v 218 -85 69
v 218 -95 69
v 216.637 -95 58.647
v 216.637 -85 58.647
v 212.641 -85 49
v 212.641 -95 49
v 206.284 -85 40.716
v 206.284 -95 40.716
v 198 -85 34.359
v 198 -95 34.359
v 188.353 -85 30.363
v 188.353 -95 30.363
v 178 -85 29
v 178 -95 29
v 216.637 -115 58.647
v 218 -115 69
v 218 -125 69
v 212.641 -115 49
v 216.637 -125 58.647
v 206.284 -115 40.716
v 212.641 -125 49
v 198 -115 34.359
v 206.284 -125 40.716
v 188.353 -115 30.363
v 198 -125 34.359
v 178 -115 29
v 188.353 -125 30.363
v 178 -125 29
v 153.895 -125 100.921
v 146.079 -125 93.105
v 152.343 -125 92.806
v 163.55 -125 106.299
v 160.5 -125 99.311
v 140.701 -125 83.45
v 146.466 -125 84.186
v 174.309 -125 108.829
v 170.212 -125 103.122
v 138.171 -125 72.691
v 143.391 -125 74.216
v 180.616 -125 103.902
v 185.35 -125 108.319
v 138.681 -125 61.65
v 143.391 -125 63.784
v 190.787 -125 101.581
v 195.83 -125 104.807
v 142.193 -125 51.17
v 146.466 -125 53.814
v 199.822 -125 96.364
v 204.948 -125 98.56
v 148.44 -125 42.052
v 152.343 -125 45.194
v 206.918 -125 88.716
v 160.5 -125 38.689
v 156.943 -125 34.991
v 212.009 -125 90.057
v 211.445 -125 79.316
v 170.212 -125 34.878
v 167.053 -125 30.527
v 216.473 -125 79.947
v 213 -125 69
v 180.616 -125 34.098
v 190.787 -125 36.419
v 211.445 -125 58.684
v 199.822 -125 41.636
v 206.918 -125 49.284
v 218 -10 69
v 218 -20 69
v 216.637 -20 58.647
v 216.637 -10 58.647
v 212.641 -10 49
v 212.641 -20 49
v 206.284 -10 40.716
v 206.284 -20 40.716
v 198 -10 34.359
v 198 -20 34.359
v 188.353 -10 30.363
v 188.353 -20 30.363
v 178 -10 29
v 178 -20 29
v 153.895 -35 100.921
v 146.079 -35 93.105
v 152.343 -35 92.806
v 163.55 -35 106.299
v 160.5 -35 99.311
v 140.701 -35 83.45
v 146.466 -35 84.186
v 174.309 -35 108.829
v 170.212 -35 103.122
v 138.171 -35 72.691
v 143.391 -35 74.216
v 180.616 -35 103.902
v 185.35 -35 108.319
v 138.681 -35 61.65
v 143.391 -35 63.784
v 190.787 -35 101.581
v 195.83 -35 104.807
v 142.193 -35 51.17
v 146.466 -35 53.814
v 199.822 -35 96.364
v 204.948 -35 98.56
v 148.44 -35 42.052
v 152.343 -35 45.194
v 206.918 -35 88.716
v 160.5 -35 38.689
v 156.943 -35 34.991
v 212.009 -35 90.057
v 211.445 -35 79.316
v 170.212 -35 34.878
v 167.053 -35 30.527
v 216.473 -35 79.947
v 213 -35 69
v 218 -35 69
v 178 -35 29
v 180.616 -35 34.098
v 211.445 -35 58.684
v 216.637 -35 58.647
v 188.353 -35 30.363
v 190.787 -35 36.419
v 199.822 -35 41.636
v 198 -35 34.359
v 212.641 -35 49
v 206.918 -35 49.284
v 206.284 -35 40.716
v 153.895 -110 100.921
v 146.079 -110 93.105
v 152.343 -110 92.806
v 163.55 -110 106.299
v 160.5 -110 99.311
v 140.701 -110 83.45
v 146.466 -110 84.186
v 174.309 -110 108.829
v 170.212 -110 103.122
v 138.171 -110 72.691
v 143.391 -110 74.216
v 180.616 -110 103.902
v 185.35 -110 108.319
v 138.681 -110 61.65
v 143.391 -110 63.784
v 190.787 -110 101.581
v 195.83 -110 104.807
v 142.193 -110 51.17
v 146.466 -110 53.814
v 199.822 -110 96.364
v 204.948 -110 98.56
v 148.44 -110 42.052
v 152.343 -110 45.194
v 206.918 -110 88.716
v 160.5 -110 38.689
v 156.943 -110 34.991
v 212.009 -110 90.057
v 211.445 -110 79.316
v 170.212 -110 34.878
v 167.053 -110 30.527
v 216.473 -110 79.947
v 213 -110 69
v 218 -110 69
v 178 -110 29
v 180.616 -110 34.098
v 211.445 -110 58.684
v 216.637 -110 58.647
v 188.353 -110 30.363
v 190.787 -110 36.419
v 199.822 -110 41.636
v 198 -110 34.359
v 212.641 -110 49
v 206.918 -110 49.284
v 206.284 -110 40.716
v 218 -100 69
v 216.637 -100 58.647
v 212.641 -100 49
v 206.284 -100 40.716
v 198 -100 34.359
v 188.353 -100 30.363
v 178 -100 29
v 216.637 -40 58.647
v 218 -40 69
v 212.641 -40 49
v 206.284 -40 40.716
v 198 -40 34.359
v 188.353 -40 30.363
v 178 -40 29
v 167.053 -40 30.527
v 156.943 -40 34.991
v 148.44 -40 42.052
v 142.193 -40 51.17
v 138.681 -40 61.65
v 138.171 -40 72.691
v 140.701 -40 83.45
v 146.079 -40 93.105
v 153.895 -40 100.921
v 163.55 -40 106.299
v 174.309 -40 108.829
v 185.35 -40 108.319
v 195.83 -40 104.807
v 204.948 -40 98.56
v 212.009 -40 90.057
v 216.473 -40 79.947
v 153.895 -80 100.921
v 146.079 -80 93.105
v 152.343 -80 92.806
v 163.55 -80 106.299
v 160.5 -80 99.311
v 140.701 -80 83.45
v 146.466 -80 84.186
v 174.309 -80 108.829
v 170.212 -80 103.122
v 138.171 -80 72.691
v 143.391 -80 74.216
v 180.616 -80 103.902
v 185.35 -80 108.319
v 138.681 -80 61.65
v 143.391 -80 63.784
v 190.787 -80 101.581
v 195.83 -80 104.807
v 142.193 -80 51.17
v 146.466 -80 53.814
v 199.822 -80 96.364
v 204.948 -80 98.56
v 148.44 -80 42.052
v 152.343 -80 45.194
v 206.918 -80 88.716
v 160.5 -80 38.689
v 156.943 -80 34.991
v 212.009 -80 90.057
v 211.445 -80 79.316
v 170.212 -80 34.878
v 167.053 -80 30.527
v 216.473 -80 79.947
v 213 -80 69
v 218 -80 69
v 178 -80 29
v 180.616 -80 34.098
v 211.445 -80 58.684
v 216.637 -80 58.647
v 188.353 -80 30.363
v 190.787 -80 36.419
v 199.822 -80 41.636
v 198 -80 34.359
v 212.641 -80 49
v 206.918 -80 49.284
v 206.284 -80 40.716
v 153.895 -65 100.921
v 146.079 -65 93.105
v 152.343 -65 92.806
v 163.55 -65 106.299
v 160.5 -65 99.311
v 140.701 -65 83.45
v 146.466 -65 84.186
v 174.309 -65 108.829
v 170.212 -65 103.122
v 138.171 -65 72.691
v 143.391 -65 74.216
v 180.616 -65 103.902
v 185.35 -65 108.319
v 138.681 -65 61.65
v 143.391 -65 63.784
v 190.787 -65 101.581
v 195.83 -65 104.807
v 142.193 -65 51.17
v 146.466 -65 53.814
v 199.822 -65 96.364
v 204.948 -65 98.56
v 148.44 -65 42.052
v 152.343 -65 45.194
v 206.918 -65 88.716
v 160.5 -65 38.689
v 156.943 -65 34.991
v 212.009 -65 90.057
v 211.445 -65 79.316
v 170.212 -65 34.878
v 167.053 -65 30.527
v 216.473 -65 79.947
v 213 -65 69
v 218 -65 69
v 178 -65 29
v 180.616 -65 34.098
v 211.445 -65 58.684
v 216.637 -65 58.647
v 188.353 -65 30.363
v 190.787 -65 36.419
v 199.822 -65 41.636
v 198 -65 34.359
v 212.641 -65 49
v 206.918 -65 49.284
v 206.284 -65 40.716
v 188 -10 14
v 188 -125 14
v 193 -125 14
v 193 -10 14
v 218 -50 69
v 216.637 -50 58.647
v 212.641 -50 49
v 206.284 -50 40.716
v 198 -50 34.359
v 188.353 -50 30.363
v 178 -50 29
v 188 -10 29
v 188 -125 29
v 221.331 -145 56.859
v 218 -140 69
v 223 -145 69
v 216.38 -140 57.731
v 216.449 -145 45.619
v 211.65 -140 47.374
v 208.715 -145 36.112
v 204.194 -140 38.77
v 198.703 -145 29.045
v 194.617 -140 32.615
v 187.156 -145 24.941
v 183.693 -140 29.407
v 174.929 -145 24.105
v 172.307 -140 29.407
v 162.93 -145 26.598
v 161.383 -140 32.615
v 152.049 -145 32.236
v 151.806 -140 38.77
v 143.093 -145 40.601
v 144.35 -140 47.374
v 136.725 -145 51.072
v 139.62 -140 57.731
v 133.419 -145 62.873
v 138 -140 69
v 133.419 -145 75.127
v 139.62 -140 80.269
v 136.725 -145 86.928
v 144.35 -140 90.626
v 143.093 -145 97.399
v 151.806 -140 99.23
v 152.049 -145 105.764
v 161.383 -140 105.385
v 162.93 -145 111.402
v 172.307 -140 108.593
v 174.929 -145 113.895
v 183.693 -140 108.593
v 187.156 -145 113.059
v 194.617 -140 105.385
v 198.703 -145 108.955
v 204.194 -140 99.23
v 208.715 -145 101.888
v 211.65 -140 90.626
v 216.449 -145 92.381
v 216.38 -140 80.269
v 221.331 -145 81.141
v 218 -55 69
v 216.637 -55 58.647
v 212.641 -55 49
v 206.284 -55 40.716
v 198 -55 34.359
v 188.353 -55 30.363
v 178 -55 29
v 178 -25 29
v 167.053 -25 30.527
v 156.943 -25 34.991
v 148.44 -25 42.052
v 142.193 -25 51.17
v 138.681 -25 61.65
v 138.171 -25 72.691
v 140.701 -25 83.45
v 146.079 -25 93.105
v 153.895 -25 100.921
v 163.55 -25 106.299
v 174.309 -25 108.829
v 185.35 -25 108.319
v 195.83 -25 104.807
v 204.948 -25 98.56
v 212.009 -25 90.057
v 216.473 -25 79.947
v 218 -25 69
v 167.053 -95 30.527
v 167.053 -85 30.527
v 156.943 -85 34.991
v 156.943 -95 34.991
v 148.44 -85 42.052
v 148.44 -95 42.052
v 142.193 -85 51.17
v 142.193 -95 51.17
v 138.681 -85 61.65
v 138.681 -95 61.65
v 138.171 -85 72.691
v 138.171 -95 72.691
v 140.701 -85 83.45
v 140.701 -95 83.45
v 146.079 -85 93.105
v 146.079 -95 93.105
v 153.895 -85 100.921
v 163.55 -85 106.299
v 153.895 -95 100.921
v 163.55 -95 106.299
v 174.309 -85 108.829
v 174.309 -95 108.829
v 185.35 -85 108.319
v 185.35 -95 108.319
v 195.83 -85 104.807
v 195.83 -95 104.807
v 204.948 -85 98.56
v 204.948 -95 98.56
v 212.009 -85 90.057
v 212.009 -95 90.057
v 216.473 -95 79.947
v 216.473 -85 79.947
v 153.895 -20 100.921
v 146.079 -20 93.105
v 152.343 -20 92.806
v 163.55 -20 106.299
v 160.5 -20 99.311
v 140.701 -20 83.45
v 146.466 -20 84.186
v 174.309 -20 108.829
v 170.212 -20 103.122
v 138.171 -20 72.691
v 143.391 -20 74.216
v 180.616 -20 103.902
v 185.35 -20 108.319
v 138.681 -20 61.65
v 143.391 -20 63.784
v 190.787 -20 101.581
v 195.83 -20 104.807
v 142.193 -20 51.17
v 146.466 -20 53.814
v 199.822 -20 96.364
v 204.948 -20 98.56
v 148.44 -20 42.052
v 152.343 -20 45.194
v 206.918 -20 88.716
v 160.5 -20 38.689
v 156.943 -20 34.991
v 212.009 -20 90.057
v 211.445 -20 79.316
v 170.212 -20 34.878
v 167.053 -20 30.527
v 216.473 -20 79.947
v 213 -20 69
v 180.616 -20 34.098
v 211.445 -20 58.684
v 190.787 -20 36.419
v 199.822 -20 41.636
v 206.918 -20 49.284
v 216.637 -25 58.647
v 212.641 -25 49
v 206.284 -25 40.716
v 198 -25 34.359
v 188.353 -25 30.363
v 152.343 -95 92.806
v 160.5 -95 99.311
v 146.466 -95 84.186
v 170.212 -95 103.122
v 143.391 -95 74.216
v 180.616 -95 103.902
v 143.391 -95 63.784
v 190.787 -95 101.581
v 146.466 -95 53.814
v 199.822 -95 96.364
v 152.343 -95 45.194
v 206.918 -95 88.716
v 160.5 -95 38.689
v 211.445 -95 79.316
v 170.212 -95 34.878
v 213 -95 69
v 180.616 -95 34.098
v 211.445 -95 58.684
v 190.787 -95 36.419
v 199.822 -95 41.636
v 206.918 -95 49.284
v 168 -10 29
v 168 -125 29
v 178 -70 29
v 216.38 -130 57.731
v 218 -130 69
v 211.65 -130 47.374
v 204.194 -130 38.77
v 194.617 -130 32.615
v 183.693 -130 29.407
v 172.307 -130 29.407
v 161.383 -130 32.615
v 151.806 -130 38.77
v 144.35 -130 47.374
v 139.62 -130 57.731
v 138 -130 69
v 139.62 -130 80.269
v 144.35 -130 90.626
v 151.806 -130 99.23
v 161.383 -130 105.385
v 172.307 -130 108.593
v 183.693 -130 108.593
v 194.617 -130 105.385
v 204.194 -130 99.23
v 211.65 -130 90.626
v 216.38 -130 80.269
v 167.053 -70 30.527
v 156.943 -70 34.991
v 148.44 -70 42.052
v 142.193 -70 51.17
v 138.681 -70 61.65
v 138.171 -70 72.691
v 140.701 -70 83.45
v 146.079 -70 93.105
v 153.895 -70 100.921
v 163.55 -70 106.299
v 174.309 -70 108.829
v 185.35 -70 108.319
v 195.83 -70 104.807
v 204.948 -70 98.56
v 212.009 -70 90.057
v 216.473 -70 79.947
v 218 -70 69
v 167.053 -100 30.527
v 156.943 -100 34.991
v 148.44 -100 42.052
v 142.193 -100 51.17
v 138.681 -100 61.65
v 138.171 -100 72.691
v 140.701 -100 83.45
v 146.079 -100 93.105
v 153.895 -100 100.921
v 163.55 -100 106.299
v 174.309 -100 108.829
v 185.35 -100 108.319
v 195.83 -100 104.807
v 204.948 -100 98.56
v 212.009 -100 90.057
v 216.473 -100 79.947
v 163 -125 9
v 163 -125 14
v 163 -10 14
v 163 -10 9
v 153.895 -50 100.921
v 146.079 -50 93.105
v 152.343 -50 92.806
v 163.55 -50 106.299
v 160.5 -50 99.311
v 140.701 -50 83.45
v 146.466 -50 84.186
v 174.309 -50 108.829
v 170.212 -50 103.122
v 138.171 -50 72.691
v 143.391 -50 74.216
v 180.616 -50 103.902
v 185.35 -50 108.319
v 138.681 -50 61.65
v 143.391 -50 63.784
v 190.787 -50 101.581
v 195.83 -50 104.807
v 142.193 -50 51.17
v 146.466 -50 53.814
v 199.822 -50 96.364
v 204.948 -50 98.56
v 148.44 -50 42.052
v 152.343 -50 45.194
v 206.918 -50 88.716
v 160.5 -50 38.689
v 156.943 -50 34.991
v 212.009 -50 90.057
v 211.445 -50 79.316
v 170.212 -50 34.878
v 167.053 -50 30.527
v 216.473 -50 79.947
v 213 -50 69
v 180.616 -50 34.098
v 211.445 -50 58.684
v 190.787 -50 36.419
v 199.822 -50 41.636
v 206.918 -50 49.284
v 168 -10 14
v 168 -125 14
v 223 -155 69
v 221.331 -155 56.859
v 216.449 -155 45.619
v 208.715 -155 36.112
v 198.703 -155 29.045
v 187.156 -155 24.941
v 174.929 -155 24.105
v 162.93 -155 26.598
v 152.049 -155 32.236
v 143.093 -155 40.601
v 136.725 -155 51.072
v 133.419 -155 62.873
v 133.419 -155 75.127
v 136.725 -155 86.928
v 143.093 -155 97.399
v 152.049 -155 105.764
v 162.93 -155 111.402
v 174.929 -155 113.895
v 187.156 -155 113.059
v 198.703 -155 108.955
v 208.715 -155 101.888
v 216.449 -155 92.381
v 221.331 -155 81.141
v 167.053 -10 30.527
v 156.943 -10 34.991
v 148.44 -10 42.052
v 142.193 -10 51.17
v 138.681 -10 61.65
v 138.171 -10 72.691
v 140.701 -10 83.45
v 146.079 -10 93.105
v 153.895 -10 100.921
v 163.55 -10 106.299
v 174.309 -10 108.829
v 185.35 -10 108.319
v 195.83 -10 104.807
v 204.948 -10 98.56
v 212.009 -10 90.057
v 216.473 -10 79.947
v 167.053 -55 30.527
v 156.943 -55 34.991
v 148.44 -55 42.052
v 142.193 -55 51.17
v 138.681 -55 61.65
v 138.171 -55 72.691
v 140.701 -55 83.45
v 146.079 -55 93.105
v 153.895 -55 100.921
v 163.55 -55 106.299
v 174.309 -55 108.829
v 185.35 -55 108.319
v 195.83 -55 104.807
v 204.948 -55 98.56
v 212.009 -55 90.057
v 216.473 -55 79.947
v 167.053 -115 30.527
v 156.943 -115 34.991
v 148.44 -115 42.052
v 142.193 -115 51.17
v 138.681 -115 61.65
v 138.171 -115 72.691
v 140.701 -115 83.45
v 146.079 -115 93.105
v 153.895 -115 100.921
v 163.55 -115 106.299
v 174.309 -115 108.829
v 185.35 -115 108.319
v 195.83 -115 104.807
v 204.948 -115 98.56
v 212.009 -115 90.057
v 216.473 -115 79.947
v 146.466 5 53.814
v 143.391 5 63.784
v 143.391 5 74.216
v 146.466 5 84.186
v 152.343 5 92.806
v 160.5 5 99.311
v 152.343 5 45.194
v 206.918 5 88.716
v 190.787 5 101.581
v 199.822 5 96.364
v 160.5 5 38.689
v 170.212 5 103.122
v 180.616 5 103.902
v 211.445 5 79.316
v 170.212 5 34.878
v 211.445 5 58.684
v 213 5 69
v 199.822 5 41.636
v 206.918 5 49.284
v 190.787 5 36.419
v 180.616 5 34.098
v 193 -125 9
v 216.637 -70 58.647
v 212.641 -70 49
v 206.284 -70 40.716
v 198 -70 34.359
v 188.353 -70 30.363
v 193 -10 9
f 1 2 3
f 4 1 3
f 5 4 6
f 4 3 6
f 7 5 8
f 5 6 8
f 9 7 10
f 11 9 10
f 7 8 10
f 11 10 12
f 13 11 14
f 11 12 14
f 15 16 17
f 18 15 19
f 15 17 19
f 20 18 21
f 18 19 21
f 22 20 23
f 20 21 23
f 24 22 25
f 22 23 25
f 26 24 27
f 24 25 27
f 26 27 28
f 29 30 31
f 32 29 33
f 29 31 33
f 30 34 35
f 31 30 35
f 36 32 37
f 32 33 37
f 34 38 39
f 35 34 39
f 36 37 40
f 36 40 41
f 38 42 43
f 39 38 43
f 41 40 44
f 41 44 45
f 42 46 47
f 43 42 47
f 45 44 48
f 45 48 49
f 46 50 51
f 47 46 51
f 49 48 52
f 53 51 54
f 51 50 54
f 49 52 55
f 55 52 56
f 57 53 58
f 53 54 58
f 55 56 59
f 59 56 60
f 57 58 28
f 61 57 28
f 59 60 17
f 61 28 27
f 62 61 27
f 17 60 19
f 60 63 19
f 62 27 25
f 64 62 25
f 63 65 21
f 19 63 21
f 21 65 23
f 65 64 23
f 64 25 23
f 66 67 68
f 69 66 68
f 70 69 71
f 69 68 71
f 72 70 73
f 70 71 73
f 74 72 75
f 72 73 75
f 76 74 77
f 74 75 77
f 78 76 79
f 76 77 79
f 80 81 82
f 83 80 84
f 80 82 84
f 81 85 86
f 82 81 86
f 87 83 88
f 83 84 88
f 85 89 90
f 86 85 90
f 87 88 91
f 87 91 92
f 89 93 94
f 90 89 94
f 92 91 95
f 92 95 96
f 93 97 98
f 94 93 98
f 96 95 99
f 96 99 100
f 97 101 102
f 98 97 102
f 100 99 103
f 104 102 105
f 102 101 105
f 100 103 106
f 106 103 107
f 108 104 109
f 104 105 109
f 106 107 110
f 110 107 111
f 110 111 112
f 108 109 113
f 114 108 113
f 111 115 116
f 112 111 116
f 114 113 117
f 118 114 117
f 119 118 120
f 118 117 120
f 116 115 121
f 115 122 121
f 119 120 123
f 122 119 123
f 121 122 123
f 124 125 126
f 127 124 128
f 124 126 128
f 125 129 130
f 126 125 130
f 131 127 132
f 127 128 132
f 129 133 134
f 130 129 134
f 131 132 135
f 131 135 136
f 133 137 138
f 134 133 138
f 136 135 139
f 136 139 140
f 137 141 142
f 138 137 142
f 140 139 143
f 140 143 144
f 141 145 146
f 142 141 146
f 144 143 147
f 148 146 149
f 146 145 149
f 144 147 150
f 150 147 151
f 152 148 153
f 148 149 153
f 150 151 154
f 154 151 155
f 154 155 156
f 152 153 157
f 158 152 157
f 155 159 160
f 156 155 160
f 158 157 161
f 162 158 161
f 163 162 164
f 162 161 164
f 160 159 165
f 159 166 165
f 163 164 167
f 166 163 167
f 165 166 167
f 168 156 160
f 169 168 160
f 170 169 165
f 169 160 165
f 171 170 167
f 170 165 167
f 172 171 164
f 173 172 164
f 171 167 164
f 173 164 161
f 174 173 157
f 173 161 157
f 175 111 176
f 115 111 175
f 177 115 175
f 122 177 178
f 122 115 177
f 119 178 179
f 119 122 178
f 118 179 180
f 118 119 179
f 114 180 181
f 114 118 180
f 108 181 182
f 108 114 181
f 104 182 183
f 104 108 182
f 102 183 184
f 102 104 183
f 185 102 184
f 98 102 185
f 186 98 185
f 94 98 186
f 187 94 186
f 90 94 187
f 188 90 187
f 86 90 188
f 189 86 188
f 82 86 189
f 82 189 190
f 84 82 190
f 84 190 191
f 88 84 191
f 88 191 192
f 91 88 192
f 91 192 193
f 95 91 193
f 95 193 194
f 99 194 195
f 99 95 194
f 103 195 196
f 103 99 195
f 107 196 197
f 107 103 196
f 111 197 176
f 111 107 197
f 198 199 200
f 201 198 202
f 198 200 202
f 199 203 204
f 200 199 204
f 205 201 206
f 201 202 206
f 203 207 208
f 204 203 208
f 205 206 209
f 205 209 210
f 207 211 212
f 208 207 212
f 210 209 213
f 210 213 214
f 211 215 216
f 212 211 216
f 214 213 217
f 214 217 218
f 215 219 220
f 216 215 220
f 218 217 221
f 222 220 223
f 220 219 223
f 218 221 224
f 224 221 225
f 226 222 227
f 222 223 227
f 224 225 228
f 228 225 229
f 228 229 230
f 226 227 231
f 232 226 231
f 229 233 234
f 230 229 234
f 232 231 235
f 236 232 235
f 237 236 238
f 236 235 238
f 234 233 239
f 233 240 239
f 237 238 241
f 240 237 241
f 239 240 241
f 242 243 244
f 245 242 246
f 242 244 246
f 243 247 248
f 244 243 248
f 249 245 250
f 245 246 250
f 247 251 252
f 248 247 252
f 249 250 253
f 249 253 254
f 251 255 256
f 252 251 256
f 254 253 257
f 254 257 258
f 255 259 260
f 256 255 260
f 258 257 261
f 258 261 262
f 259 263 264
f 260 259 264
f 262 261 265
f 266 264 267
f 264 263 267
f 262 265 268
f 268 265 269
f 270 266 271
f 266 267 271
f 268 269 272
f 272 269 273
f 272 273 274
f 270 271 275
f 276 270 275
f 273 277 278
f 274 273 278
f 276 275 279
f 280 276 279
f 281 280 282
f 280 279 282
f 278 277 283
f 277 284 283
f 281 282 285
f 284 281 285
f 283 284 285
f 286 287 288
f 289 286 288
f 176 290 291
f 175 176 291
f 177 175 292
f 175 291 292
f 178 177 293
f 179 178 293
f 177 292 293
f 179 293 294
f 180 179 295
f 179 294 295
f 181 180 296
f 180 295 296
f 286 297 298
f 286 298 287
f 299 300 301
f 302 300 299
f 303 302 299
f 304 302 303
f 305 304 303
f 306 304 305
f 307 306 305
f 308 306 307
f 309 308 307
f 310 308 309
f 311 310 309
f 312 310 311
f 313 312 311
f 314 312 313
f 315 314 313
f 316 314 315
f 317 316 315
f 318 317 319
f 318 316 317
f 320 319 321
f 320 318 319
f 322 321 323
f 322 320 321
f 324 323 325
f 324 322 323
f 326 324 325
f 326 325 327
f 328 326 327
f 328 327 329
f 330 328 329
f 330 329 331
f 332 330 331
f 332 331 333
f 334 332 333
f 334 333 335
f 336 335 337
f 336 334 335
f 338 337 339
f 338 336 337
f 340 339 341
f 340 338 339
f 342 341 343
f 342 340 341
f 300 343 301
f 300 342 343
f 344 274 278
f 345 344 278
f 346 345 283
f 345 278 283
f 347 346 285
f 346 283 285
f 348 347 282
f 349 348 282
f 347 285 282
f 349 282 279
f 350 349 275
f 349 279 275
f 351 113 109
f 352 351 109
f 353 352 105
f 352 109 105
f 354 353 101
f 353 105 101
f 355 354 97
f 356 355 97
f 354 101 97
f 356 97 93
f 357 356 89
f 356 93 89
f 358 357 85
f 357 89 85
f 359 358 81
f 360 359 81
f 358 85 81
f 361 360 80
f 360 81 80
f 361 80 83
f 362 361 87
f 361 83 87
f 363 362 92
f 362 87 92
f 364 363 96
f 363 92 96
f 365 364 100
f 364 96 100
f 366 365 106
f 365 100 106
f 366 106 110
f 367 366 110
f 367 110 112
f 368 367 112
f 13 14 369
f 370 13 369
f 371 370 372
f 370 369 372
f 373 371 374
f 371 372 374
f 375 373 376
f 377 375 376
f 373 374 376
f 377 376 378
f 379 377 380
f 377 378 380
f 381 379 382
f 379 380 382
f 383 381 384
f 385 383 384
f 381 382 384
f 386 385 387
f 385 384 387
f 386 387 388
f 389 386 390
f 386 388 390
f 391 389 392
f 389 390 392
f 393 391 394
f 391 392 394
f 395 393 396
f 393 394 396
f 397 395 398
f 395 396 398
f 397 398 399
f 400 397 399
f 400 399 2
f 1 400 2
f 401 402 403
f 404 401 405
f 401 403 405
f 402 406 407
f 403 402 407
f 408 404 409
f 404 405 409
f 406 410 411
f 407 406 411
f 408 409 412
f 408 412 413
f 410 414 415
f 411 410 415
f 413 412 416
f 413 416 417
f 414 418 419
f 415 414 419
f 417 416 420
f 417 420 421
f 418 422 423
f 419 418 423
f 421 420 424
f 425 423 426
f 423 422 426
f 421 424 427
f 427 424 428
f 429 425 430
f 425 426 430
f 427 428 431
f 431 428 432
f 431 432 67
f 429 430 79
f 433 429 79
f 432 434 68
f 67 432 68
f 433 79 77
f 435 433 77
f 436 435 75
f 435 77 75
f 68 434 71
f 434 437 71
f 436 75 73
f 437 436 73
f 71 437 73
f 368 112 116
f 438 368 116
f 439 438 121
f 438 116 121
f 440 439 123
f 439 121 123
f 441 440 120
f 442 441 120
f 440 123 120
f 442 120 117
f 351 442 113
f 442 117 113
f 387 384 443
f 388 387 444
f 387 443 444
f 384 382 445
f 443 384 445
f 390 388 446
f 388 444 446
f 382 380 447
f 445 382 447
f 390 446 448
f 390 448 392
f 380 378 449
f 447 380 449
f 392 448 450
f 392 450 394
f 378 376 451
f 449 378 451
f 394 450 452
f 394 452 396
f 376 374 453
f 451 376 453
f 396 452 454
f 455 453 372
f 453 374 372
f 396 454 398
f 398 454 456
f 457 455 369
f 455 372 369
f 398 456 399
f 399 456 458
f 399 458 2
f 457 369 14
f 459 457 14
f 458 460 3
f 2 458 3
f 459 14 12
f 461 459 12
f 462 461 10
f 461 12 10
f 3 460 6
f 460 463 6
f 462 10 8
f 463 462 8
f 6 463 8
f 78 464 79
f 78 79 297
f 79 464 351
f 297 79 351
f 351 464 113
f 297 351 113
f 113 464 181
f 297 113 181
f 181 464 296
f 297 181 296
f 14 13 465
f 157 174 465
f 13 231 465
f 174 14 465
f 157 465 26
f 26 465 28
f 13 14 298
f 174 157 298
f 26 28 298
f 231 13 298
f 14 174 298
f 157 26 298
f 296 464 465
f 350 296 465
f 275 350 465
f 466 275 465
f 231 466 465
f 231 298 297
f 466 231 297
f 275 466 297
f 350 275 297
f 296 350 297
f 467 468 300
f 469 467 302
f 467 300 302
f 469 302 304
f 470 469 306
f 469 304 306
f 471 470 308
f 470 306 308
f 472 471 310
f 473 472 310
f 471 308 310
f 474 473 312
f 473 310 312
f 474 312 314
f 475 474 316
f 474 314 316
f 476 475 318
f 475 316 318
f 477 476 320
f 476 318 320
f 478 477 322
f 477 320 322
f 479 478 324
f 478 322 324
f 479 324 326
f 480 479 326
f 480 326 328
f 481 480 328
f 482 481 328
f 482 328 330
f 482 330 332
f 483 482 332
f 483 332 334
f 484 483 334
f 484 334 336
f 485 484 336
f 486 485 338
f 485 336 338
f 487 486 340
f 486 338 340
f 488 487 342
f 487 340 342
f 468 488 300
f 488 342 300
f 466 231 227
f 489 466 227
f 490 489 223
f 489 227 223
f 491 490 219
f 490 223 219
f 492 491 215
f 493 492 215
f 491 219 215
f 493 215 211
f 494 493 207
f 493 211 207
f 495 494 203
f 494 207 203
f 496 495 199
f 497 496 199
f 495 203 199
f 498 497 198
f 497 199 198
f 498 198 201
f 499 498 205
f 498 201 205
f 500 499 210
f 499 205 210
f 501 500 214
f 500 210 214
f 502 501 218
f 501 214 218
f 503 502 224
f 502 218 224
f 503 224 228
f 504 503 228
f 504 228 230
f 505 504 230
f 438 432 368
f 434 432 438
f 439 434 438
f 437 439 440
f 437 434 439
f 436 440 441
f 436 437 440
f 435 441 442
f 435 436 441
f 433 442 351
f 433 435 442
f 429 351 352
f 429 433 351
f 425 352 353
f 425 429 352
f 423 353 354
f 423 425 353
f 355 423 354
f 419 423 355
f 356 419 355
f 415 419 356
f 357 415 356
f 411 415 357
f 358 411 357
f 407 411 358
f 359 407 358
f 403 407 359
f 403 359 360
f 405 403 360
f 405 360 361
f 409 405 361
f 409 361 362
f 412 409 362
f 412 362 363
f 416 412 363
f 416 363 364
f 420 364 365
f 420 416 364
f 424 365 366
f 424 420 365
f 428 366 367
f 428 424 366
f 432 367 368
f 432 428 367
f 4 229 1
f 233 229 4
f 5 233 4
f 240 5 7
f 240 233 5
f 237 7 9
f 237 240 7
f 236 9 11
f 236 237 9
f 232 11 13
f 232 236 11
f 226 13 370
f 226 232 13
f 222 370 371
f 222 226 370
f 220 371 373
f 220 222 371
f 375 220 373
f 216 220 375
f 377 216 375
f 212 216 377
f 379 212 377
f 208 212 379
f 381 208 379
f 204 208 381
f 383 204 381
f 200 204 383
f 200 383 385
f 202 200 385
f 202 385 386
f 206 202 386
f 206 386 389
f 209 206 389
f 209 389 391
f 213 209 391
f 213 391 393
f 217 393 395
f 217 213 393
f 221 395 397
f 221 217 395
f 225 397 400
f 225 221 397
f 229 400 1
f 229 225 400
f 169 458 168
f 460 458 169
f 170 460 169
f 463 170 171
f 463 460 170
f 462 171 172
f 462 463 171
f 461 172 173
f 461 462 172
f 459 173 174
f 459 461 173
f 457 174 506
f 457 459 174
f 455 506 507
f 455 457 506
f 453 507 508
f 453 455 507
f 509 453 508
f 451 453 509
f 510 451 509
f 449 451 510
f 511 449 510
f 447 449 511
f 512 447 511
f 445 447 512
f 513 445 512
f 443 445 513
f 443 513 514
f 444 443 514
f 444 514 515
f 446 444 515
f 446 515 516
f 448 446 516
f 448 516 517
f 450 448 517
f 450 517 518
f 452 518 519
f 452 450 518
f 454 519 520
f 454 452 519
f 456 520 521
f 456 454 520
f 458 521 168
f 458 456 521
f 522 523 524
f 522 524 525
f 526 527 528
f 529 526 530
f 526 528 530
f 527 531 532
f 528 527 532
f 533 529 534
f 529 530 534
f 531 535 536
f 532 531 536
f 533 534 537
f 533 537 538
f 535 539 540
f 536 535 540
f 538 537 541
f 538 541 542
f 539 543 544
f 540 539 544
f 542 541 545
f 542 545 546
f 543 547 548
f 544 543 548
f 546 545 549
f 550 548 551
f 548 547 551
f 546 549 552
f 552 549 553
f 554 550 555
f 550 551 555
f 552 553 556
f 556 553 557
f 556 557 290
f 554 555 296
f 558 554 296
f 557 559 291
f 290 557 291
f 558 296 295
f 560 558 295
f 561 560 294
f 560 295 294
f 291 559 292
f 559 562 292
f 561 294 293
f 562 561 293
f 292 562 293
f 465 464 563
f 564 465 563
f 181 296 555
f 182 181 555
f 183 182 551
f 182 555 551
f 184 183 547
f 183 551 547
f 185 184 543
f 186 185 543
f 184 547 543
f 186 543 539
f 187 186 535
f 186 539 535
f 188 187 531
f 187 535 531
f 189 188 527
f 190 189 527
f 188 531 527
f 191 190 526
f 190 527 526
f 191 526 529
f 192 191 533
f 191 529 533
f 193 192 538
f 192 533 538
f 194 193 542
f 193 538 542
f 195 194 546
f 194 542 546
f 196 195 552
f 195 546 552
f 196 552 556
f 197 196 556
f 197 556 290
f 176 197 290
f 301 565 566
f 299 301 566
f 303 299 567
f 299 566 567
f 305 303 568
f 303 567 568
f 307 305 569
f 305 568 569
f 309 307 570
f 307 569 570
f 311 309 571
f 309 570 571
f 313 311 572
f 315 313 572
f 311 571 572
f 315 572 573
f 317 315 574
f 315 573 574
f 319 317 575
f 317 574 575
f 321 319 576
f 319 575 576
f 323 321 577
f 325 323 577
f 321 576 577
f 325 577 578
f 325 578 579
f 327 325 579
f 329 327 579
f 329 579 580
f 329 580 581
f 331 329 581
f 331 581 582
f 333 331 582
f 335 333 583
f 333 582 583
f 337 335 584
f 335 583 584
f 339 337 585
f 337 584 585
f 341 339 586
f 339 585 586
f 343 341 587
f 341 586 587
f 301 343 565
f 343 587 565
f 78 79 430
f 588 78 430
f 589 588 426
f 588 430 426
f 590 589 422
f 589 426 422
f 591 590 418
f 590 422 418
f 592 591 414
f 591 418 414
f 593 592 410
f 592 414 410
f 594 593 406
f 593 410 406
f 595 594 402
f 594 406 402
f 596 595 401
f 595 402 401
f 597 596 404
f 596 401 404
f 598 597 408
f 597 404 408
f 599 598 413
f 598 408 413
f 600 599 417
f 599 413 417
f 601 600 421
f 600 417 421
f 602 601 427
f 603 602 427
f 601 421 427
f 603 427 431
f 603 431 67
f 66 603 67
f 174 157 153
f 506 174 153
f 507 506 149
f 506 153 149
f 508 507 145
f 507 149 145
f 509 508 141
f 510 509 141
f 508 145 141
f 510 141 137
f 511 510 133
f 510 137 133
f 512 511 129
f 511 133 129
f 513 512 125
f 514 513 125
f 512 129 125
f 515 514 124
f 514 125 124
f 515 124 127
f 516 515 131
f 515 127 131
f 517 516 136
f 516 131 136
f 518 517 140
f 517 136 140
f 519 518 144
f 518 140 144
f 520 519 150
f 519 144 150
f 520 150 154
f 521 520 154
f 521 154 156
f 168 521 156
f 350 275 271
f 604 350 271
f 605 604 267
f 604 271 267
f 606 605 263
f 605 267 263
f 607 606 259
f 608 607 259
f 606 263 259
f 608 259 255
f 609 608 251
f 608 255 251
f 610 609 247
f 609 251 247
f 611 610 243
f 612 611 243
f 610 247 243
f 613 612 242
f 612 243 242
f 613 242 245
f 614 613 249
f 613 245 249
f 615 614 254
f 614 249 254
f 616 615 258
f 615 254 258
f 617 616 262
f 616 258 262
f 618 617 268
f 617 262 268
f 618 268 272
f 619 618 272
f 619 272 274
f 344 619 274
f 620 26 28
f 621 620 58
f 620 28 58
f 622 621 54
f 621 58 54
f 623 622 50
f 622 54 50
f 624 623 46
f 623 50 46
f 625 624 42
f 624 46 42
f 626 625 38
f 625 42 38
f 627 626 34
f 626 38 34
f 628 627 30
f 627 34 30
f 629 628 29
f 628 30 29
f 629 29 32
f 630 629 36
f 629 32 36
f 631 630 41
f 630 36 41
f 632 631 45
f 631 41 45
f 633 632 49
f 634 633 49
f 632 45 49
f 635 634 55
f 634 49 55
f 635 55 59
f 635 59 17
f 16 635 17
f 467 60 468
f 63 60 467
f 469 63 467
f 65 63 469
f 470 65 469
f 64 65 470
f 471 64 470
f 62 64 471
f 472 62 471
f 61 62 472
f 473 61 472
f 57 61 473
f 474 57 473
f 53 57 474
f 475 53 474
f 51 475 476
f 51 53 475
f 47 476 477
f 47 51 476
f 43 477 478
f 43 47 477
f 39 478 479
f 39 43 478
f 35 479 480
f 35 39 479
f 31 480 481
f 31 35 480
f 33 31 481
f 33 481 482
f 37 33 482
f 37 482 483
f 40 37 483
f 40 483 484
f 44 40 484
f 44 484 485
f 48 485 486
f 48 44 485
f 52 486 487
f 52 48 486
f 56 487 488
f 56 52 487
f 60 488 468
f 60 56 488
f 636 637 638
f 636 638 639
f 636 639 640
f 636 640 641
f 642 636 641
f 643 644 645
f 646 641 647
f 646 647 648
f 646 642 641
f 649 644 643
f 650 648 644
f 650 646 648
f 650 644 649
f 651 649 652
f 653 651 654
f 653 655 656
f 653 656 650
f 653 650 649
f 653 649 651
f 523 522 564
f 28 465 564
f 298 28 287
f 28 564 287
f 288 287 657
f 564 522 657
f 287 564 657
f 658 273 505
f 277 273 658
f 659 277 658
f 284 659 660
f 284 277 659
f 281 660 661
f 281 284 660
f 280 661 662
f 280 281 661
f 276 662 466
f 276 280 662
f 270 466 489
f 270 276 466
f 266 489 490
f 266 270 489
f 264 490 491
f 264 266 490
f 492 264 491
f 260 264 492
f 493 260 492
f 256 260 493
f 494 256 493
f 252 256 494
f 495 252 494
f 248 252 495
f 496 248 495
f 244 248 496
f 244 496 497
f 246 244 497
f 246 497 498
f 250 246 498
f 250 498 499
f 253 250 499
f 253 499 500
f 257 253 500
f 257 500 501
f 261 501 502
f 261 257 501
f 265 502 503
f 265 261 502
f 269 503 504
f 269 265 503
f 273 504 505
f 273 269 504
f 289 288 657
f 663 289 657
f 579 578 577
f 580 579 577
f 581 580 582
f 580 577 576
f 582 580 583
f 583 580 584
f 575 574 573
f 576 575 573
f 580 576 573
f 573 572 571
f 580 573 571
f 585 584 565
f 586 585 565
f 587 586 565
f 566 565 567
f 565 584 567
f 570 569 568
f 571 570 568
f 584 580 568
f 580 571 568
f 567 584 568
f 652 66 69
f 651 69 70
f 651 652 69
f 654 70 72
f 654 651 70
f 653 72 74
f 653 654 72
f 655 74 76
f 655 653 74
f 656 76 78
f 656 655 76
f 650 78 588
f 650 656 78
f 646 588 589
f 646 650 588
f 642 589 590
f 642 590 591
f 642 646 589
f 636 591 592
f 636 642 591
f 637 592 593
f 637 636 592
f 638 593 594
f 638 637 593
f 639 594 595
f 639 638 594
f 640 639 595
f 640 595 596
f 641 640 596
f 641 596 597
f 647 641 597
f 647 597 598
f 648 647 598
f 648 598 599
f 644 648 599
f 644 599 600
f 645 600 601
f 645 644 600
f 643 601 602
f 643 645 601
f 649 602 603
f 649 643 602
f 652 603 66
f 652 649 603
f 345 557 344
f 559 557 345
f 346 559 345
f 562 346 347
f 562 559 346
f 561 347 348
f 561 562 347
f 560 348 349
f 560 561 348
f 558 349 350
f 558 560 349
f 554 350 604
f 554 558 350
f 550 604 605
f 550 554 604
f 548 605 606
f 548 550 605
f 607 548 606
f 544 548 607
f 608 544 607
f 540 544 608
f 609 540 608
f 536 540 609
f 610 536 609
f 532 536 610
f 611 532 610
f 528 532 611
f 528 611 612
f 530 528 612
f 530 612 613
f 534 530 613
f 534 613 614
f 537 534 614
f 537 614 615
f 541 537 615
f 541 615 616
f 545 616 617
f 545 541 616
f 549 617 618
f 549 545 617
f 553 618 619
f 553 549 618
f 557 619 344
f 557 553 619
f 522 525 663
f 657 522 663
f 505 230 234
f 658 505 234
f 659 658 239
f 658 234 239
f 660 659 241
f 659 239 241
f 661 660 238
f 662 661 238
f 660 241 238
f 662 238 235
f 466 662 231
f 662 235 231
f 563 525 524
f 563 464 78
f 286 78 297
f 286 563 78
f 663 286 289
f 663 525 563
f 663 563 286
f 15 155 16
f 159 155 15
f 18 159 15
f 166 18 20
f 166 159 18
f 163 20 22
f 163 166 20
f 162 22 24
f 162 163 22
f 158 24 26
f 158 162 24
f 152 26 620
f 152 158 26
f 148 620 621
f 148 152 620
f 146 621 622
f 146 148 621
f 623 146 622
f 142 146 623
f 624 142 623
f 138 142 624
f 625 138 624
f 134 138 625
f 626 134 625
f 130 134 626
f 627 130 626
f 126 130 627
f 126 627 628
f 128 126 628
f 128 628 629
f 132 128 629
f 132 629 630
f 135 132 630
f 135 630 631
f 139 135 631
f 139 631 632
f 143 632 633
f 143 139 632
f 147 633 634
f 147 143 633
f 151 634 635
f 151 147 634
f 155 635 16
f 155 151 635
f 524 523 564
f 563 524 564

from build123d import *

# Parameters (mm, degrees)
CYLINDER010_R             = 40
CYLINDER010_DEPTH         = 10
CYLINDER008_R             = 40
CYLINDER008_DEPTH         = 10
CYLINDER009_R             = 40
CYLINDER009_DEPTH         = 10
CYLINDER007_R             = 40
CYLINDER007_DEPTH         = 10
CYLINDER006_R             = 40
CYLINDER006_DEPTH         = 10
CYLINDER005_R             = 40
CYLINDER005_DEPTH         = 10
CYLINDER078_R             = 40
CYLINDER078_DEPTH         = 10
CYLINDER081_R             = 40
CYLINDER081_DEPTH         = 10
CYLINDER080_R             = 45
CYLINDER080_DEPTH         = 10
CYLINDER079_R             = 40
CYLINDER079_DEPTH         = 10
BOX066_W                  = 20
BOX066_H                  = 15
BOX066_DEPTH              = 115
BOX067_W                  = 30
BOX067_H                  = 5
BOX067_DEPTH              = 115
FUSION043_PLACEMENT_ANGLE = 90


with BuildPart() as cylinder010:
    # Cylinder010 → Cylinder010 (new body)
    with BuildSketch(Plane.XY):
        Circle(CYLINDER010_R)
    extrude(amount=CYLINDER010_DEPTH)


with BuildPart() as middle007:
    # Cone010 → Cone010 (revolve)
    with BuildSketch(Plane(origin=(0, 0, 10), x_dir=(1, 0, 0), z_dir=(0, -1, 0))):
        Polygon((0, 0), (40, 0), (35, 5), (0, 5), align=None)
    revolve(axis=Axis((0, 0, 10), (0, 0, 1)))

    # Fusion044: union Cylinder010
    add(cylinder010.part)


with BuildPart() as middle007_1:
    # Fusion044 placement: moved
    add(middle007.part.moved(Location((85, -60, -23))))


with BuildPart() as cylinder008:
    # Cylinder008 → Cylinder008 (new body)
    with BuildSketch(Plane.XY):
        Circle(CYLINDER008_R)
    extrude(amount=CYLINDER008_DEPTH)


with BuildPart() as middle006:
    # Cone008 → Cone008 (revolve)
    with BuildSketch(Plane(origin=(0, 0, 10), x_dir=(1, 0, 0), z_dir=(0, -1, 0))):
        Polygon((0, 0), (40, 0), (35, 5), (0, 5), align=None)
    revolve(axis=Axis((0, 0, 10), (0, 0, 1)))

    # Fusion008: union Cylinder008
    add(cylinder008.part)


with BuildPart() as middle006_1:
    # Fusion008 placement: moved
    add(middle006.part.moved(Location((85, -60, -8))))


with BuildPart() as cylinder009:
    # Cylinder009 → Cylinder009 (new body)
    with BuildSketch(Plane.XY):
        Circle(CYLINDER009_R)
    extrude(amount=CYLINDER009_DEPTH)


with BuildPart() as middle002:
    # Cone009 → Cone009 (revolve)
    with BuildSketch(Plane(origin=(0, 0, 10), x_dir=(1, 0, 0), z_dir=(0, -1, 0))):
        Polygon((0, 0), (40, 0), (35, 5), (0, 5), align=None)
    revolve(axis=Axis((0, 0, 10), (0, 0, 1)))

    # Fusion047: union Cylinder009
    add(cylinder009.part)


with BuildPart() as middle002_1:
    # Fusion047 placement: moved
    add(middle002.part.moved(Location((85, -60, 52))))


with BuildPart() as cylinder007:
    # Cylinder007 → Cylinder007 (new body)
    with BuildSketch(Plane.XY):
        Circle(CYLINDER007_R)
    extrude(amount=CYLINDER007_DEPTH)


with BuildPart() as middle005:
    # Cone007 → Cone007 (revolve)
    with BuildSketch(Plane(origin=(0, 0, 10), x_dir=(1, 0, 0), z_dir=(0, -1, 0))):
        Polygon((0, 0), (40, 0), (35, 5), (0, 5), align=None)
    revolve(axis=Axis((0, 0, 10), (0, 0, 1)))

    # Fusion007: union Cylinder007
    add(cylinder007.part)


with BuildPart() as middle005_1:
    # Fusion007 placement: moved
    add(middle005.part.moved(Location((85, -60, 7))))


with BuildPart() as cylinder006:
    # Cylinder006 → Cylinder006 (new body)
    with BuildSketch(Plane.XY):
        Circle(CYLINDER006_R)
    extrude(amount=CYLINDER006_DEPTH)


with BuildPart() as middle004:
    # Cone006 → Cone006 (revolve)
    with BuildSketch(Plane(origin=(0, 0, 10), x_dir=(1, 0, 0), z_dir=(0, -1, 0))):
        Polygon((0, 0), (40, 0), (35, 5), (0, 5), align=None)
    revolve(axis=Axis((0, 0, 10), (0, 0, 1)))

    # Fusion046: union Cylinder006
    add(cylinder006.part)


with BuildPart() as middle004_1:
    # Fusion046 placement: moved
    add(middle004.part.moved(Location((85, -60, 22))))


with BuildPart() as cylinder005:
    # Cylinder005 → Cylinder005 (new body)
    with BuildSketch(Plane.XY):
        Circle(CYLINDER005_R)
    extrude(amount=CYLINDER005_DEPTH)


with BuildPart() as middle003:
    # Cone005 → Cone005 (revolve)
    with BuildSketch(Plane(origin=(0, 0, 10), x_dir=(1, 0, 0), z_dir=(0, -1, 0))):
        Polygon((0, 0), (40, 0), (35, 5), (0, 5), align=None)
    revolve(axis=Axis((0, 0, 10), (0, 0, 1)))

    # Fusion045: union Cylinder005
    add(cylinder005.part)


with BuildPart() as middle003_1:
    # Fusion045 placement: moved
    add(middle003.part.moved(Location((85, -60, 37))))


with BuildPart() as cylinder078:
    # Cylinder078 → Cylinder078 (new body)
    with BuildSketch(Plane.XY):
        Circle(CYLINDER078_R)
    extrude(amount=CYLINDER078_DEPTH)


with BuildPart() as middle008:
    # Cone004 → Cone004 (revolve)
    with BuildSketch(Plane(origin=(0, 0, 10), x_dir=(1, 0, 0), z_dir=(0, -1, 0))):
        Polygon((0, 0), (40, 0), (35, 5), (0, 5), align=None)
    revolve(axis=Axis((0, 0, 10), (0, 0, 1)))

    # Fusion004: union Cylinder078
    add(cylinder078.part)


with BuildPart() as middle008_1:
    # Fusion004 placement: moved
    add(middle008.part.moved(Location((85, -60, -38))))


with BuildPart() as cylinder081:
    # Cylinder081 → Cylinder081 (new body)
    with BuildSketch(Plane.XY):
        Circle(CYLINDER081_R)
    extrude(amount=CYLINDER081_DEPTH)


with BuildPart() as middle001:
    # Cone003 → Cone003 (revolve)
    with BuildSketch(Plane(origin=(0, 0, 10), x_dir=(1, 0, 0), z_dir=(0, -1, 0))):
        Polygon((0, 0), (40, 0), (35, 5), (0, 5), align=None)
    revolve(axis=Axis((0, 0, 10), (0, 0, 1)))

    # Fusion003: union Cylinder081
    add(cylinder081.part)


with BuildPart() as middle001_1:
    # Fusion003 placement: moved
    add(middle001.part.moved(Location((85, -60, 67))))


with BuildPart() as cylinder080:
    # Cylinder080 → Cylinder080 (new body)
    with BuildSketch(Plane.XY):
        Circle(CYLINDER080_R)
    extrude(amount=CYLINDER080_DEPTH)


with BuildPart() as bottom:
    # Cone002 → Cone002 (revolve)
    with BuildSketch(Plane(origin=(0, 0, 10), x_dir=(1, 0, 0), z_dir=(0, -1, 0))):
        Polygon((0, 0), (45, 0), (40, 5), (0, 5), align=None)
    revolve(axis=Axis((0, 0, 10), (0, 0, 1)))

    # Fusion002: union Cylinder080
    add(cylinder080.part)


with BuildPart() as bottom_1:
    # Fusion002 placement: moved
    add(bottom.part.moved(Location((85, -60, -53))))


with BuildPart() as cylinder079:
    # Cylinder079 → Cylinder079 (new body)
    with BuildSketch(Plane.XY):
        Circle(CYLINDER079_R)
    extrude(amount=CYLINDER079_DEPTH)


with BuildPart() as top:
    # Cone → Cone (revolve)
    with BuildSketch(Plane(origin=(0, 0, 10), x_dir=(1, 0, 0), z_dir=(0, -1, 0))):
        Polygon((0, 0), (40, 0), (35, 15), (0, 15), align=None)
    revolve(axis=Axis((0, 0, 10), (0, 0, 1)))

    # Fusion048: union Cylinder079
    add(cylinder079.part)


with BuildPart() as top_1:
    # Fusion048 placement: moved
    add(top.part.moved(Location((85, -60, 82))))


with BuildPart() as holdermain:
    # Box066 → Box066 (new body)
    with BuildSketch(Plane(origin=(75, -20, -23), x_dir=(1, 0, 0), z_dir=(0, 0, 1))):
        with Locations((10, 7.5)):
            Rectangle(BOX066_W, BOX066_H)
    extrude(amount=BOX066_DEPTH)


with BuildPart() as radiation_shield:
    # Box067 → Box067 (new body)
    with BuildSketch(Plane(origin=(70, -5, -23), x_dir=(1, 0, 0), z_dir=(0, 0, 1))):
        with Locations((15, 2.5)):
            Rectangle(BOX067_W, BOX067_H)
    extrude(amount=BOX067_DEPTH)

    # Fusion042: union HolderMain
    add(holdermain.part)

    # Fusion043: union Middle007, Middle006, Middle002, Middle005, Middle004, Middle003, Middle008, Middle001, Bottom, Top
    add(middle007_1.part)
    add(middle006_1.part)
    add(middle002_1.part)
    add(middle005_1.part)
    add(middle004_1.part)
    add(middle003_1.part)
    add(middle008_1.part)
    add(middle001_1.part)
    add(bottom_1.part)
    add(top_1.part)


with BuildPart() as radiation_shield_1:
    # Fusion043 placement: moved
    add(radiation_shield.part.moved(Location((93, -102, 9))).rotate(Axis((93, -102, 9), (-1, 0, 0)), FUSION043_PLACEMENT_ANGLE))


solid = radiation_shield_1.part
